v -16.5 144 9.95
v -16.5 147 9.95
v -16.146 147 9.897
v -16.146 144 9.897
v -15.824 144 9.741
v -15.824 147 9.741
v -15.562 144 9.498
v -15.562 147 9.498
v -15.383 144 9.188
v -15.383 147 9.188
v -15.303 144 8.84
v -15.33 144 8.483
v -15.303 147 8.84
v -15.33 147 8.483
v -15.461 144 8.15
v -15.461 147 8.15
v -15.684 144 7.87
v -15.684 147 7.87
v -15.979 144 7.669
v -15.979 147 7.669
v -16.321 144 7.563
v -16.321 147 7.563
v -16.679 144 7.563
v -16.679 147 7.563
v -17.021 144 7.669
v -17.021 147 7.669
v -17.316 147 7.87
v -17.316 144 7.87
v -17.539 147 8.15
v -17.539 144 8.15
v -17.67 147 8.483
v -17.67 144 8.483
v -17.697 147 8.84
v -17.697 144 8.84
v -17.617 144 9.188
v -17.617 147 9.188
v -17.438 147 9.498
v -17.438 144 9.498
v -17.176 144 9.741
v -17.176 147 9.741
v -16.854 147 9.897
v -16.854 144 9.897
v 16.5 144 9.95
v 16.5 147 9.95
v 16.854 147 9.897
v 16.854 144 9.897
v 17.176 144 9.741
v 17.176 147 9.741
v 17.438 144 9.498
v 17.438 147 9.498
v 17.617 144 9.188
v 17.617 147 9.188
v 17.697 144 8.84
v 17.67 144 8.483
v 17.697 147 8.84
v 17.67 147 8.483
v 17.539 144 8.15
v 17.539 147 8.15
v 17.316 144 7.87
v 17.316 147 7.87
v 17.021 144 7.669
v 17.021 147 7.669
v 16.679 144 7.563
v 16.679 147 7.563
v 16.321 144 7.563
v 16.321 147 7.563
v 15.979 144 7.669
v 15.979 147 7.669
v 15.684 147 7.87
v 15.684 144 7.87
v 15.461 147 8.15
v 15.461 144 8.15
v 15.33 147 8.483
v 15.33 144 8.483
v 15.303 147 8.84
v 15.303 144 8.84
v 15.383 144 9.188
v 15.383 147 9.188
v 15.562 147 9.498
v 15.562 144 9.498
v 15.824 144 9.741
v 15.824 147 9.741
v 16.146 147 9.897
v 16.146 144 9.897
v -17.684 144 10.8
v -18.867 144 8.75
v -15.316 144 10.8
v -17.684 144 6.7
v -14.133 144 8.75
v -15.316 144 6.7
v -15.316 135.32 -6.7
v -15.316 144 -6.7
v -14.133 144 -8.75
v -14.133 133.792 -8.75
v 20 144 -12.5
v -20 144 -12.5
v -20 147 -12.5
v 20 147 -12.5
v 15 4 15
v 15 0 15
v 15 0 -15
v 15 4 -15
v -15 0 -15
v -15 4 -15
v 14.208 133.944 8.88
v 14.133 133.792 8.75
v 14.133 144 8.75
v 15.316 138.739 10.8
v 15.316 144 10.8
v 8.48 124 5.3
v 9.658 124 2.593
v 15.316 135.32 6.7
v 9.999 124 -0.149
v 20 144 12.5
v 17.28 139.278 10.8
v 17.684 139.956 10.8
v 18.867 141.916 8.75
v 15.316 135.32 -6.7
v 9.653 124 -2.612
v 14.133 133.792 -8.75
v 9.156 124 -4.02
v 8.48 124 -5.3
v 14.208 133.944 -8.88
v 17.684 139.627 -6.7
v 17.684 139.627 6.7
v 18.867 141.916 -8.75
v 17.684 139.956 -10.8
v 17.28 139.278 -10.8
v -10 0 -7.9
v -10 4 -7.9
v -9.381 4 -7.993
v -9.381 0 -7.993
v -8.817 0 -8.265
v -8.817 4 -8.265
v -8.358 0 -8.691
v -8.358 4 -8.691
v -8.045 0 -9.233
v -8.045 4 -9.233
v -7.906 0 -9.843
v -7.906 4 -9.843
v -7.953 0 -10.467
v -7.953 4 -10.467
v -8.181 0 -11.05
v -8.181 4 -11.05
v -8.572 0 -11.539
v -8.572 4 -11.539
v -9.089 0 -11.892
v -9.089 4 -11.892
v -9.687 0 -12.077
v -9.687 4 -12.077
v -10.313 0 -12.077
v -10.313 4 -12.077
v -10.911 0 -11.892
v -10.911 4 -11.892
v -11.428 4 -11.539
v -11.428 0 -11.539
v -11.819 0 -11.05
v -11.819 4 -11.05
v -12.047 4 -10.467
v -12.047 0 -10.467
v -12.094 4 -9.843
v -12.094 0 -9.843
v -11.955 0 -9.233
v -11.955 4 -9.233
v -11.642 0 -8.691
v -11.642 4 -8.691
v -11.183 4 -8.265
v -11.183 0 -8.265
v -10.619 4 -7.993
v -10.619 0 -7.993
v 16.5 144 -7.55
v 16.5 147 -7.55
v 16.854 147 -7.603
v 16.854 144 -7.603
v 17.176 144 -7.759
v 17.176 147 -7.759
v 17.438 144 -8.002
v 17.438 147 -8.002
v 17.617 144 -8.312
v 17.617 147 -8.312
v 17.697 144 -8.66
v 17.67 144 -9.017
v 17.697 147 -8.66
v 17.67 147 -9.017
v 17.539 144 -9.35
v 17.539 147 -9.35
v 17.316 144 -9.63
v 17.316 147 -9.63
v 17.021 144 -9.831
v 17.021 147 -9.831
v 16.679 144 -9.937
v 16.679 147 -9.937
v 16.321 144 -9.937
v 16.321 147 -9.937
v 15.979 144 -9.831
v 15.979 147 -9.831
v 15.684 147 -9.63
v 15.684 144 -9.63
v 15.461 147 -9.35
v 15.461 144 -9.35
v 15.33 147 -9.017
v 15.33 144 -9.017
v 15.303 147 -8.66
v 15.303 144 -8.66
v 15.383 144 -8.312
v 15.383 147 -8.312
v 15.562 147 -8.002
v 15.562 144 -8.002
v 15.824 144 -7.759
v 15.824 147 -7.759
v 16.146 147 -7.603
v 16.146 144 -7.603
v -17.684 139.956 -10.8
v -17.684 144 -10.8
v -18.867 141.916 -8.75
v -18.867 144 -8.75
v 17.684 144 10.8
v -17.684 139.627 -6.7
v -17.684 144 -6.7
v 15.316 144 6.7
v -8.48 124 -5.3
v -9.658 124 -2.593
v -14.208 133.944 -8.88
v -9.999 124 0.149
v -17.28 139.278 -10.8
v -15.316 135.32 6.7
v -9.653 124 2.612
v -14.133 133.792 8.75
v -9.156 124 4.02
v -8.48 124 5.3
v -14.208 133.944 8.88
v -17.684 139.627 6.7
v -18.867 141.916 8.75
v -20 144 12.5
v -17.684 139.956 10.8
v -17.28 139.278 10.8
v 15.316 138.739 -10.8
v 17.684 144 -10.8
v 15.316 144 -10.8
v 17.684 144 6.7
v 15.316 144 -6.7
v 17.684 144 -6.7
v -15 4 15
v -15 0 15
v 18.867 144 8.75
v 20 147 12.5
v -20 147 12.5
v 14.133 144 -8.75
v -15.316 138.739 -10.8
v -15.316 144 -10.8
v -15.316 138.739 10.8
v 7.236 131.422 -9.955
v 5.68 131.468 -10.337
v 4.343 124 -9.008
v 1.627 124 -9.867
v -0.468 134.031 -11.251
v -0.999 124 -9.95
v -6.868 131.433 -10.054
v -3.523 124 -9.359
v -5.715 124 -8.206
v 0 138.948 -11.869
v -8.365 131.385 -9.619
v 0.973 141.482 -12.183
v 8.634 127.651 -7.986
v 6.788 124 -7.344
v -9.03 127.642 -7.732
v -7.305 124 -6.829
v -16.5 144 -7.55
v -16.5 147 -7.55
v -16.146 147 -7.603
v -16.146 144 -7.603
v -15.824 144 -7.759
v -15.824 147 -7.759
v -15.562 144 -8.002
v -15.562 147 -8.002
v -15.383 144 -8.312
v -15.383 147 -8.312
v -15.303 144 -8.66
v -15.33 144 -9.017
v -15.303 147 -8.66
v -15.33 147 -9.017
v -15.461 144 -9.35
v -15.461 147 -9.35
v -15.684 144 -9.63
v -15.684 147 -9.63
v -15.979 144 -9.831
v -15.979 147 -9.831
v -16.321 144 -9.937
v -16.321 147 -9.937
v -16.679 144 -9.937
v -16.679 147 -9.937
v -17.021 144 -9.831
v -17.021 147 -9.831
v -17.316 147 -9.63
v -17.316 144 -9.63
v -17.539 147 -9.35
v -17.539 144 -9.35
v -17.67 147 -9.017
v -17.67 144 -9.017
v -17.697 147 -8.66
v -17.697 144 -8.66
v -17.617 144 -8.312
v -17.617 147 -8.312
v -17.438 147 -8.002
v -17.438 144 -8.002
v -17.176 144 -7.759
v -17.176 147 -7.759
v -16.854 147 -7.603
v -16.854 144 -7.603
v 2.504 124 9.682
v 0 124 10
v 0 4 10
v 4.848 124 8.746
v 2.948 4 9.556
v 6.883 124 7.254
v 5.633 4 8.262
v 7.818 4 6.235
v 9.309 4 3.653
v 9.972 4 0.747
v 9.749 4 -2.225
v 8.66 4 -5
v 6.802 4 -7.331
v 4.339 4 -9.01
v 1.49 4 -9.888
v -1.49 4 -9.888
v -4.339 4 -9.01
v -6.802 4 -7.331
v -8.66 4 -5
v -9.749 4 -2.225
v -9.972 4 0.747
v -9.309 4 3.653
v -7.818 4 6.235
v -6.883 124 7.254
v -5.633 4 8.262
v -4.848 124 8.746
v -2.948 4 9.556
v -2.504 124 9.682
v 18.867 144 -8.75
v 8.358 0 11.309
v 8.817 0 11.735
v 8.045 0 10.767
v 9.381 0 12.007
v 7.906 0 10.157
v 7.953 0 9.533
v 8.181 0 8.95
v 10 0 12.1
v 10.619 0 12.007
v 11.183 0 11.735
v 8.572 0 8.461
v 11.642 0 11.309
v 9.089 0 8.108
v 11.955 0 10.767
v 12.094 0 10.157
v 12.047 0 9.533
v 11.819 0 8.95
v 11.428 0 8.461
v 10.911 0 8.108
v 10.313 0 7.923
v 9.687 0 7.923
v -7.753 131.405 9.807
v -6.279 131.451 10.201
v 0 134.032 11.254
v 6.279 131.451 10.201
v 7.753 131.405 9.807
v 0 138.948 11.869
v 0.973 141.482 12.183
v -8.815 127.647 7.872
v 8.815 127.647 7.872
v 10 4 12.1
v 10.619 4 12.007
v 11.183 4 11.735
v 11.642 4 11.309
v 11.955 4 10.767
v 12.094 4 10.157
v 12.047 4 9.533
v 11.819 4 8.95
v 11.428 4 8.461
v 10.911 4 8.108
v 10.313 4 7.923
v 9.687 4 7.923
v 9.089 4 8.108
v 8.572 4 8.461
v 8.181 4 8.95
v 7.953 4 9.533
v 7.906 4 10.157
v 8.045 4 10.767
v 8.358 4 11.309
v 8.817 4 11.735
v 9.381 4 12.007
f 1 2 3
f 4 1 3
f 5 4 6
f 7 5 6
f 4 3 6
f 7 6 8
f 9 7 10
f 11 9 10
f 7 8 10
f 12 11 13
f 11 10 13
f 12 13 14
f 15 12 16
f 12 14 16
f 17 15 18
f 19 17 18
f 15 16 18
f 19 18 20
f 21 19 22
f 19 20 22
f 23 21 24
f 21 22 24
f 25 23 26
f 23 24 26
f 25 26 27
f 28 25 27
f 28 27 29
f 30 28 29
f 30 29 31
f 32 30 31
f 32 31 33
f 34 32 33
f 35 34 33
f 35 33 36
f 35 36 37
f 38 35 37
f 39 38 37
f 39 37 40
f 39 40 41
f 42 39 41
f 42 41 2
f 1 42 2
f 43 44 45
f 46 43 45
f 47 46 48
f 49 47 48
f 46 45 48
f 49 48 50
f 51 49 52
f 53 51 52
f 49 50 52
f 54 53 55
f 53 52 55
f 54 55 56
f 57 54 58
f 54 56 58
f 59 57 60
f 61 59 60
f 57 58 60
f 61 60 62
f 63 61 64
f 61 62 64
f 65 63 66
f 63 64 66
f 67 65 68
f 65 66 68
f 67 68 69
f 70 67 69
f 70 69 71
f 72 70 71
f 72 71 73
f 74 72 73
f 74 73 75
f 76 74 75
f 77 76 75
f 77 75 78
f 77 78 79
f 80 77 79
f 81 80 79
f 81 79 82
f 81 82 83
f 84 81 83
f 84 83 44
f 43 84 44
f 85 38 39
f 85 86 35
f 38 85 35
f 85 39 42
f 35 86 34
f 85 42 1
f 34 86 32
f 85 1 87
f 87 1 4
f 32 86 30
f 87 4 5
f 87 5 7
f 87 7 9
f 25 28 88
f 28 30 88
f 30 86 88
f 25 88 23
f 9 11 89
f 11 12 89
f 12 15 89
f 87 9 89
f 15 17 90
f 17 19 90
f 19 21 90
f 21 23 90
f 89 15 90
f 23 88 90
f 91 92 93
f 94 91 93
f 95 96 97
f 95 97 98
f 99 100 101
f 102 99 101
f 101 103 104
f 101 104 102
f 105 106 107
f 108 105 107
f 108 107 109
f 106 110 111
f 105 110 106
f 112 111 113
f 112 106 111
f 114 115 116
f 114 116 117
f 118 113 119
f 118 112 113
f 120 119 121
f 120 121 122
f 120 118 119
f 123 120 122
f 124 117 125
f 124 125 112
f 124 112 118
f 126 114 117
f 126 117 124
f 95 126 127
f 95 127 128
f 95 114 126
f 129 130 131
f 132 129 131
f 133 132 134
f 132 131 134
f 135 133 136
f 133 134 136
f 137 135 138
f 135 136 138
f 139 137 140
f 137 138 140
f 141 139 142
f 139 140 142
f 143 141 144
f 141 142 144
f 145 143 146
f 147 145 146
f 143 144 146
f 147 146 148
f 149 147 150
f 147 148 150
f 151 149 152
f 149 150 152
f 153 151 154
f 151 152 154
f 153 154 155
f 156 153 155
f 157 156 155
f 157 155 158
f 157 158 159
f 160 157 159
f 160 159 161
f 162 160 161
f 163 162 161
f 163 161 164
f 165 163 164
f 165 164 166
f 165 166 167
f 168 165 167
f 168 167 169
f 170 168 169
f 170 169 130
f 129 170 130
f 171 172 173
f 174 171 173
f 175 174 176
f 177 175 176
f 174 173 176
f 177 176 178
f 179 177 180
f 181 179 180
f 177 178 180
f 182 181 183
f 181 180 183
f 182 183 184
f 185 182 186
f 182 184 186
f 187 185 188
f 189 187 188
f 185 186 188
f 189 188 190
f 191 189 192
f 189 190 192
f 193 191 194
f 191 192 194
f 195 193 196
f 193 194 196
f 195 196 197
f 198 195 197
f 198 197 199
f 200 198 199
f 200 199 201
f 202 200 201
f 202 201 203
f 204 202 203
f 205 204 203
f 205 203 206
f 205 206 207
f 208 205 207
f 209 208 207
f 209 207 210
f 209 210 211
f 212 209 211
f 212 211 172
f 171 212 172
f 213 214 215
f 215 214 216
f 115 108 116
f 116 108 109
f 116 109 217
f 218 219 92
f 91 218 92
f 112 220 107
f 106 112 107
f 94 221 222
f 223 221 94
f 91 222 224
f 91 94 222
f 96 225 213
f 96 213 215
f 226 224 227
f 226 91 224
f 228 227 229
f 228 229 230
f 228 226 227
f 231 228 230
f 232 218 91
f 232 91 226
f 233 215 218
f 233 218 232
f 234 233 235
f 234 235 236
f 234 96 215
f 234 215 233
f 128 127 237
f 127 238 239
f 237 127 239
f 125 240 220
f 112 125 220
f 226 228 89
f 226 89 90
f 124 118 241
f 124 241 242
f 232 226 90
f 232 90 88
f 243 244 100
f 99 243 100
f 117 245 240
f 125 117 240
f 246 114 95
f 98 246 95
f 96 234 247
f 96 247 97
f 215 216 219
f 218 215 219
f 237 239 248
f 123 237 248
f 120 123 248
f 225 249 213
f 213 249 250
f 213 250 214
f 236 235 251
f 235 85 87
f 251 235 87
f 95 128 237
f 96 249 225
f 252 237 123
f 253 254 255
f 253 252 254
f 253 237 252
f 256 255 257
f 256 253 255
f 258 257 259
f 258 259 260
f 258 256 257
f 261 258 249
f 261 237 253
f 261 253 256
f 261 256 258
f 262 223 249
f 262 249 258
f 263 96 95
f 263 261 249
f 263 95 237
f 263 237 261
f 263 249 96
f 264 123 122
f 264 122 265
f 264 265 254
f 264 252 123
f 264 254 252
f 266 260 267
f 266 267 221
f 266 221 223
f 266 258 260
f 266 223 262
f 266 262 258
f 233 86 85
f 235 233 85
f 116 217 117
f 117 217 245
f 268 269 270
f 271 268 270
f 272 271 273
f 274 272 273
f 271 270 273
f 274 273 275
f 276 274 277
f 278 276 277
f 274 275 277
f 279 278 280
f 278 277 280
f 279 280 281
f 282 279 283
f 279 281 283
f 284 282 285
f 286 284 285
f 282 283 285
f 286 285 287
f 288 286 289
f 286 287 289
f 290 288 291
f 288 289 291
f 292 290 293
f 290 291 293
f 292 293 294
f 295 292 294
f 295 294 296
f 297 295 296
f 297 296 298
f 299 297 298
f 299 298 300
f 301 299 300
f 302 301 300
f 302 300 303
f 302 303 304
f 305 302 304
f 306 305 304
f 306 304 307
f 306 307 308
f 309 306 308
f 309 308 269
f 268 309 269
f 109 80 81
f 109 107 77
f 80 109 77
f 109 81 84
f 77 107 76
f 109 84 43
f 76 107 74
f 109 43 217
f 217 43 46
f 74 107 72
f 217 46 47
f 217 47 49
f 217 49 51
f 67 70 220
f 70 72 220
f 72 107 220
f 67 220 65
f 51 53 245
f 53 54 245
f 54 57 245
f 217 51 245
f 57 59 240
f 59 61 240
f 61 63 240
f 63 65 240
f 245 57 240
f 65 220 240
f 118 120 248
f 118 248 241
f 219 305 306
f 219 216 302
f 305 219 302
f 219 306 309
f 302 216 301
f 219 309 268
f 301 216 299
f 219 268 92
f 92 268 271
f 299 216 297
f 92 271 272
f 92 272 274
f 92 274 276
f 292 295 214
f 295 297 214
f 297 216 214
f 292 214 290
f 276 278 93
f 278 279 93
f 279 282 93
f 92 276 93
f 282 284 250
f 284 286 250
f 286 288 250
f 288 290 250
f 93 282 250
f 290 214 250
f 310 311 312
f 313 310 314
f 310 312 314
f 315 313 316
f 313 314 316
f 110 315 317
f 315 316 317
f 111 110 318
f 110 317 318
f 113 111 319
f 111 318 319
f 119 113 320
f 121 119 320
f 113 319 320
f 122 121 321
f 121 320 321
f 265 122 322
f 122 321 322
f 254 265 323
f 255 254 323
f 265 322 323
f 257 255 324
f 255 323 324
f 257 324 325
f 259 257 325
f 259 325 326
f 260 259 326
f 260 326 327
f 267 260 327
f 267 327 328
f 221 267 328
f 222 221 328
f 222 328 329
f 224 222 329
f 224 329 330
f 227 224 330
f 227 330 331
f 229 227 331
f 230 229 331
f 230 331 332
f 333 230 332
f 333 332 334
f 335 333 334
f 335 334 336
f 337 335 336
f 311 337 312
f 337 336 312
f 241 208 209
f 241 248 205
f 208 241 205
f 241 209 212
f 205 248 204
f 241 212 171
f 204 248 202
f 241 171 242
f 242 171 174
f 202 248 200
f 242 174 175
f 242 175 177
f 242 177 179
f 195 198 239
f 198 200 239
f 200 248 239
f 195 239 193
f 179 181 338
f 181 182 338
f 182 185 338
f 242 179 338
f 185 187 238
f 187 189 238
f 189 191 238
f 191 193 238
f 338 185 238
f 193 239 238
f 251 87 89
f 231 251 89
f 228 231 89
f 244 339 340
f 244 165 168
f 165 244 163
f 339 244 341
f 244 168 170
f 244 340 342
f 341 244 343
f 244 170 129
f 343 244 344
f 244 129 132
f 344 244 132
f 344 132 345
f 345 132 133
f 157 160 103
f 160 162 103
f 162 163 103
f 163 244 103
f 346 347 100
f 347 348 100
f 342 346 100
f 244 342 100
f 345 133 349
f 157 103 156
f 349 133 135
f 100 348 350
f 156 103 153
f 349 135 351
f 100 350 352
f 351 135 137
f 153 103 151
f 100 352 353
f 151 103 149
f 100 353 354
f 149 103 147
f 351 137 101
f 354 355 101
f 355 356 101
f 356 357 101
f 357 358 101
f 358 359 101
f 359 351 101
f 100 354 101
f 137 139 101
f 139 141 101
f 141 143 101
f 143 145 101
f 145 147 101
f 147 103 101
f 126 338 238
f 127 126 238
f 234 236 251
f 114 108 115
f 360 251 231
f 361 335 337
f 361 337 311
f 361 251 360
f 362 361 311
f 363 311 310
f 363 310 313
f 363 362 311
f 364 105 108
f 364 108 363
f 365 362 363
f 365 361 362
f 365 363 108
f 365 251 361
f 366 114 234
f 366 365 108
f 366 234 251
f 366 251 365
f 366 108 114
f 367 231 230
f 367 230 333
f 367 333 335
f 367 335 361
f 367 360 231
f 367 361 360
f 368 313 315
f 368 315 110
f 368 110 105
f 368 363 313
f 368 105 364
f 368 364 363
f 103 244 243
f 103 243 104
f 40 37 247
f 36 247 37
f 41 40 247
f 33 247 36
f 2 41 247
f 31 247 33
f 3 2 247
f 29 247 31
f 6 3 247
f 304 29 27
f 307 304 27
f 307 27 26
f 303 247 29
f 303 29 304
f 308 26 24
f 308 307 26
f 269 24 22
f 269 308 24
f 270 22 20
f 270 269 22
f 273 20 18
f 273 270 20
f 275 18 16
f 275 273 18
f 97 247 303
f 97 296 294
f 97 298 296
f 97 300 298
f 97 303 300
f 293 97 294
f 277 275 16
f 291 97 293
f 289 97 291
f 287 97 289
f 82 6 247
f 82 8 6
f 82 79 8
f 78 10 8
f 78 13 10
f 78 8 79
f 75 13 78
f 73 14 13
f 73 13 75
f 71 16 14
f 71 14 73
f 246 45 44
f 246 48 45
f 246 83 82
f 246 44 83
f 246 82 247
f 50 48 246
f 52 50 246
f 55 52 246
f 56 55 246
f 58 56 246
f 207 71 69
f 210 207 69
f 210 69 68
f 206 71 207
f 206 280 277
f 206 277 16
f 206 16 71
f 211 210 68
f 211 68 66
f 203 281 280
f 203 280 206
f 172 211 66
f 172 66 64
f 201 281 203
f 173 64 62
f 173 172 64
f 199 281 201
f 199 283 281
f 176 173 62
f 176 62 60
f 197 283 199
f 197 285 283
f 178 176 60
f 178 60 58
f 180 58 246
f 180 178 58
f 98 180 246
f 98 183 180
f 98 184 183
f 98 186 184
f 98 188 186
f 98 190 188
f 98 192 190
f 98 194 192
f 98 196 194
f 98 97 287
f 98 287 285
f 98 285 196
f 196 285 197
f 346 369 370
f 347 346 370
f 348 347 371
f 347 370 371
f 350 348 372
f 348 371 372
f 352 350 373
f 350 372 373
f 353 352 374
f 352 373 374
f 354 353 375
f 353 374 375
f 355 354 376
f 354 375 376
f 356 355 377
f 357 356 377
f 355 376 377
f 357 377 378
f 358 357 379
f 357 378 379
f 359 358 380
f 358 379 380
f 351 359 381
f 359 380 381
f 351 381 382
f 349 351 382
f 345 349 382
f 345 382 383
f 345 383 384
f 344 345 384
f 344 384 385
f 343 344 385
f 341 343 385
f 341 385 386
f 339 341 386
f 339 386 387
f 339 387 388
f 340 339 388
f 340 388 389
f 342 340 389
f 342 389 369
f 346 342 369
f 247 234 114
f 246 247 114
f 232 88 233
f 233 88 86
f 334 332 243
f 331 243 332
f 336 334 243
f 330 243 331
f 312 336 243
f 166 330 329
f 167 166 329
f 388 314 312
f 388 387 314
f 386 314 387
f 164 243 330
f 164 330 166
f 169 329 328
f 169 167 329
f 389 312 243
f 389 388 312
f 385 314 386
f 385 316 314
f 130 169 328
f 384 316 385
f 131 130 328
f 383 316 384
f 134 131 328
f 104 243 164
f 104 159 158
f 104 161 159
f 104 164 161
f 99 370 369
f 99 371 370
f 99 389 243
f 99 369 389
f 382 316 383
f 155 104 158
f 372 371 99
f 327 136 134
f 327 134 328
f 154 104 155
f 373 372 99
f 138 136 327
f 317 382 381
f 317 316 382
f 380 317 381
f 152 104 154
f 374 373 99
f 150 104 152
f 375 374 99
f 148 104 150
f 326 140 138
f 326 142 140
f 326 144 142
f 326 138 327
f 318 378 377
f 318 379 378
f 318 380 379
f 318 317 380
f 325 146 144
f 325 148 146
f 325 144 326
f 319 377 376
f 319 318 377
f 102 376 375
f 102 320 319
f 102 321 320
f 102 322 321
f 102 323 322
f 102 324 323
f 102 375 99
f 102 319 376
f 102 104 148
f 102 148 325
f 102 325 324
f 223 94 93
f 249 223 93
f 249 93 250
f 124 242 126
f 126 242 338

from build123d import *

# Parameters (mm, degrees)
SKETCH1_W           = 30
SKETCH1_H           = 30
BOSS_EXTRUDE1_DEPTH = 4
SKETCH2_R           = 2.1
CUT_EXTRUDE1_DEPTH  = 22.587033145
SKETCH3_R           = 10
BOSS_EXTRUDE2_DEPTH = 120
SKETCH4_2_W         = 40
SKETCH4_2_H         = 25
BOSS_EXTRUDE3_DEPTH = 3
SKETCH7_R           = 1.2
CUT_EXTRUDE2_DEPTH  = 30
CUT_EXTRUDE3_DEPTH  = 30


with BuildPart() as part:
    # Sketch1 → Boss-Extrude1 (new body)
    with BuildSketch(Plane(origin=(0, 0, 0), x_dir=(1, 0, 0), z_dir=(0, 1, 0))):
        Rectangle(SKETCH1_W, SKETCH1_H)
    extrude(amount=BOSS_EXTRUDE1_DEPTH)

    # Sketch2 → Cut-Extrude1 (cut, through all)
    with BuildSketch(Plane(origin=(0, 4, 0), x_dir=(1, 0, 0), z_dir=(0, 1, 0))):
        with Locations((-10, 10)):
            Circle(SKETCH2_R)
        with Locations((10, -10)):
            Circle(SKETCH2_R)
    extrude(amount=-CUT_EXTRUDE1_DEPTH, mode=Mode.SUBTRACT)

    # Sketch3 → Boss-Extrude2 (add)
    with BuildSketch(Plane(origin=(0, 4, 0), x_dir=(1, 0, 0), z_dir=(0, 1, 0))):
        Circle(SKETCH3_R)
    extrude(amount=BOSS_EXTRUDE2_DEPTH)

    # Sketch5 for Loft1 → Loft1 section 0
    with BuildSketch(Plane(origin=(0, 124, 0), x_dir=(1, 0, 0), z_dir=(0, 1, 0))):
        with BuildLine():
            # circular arc as an exact rational Bezier (weights 1, cos(half-angle), 1)
            Bezier((-8.47998304, -5.2999894), (0, -18.867962264), (8.47998304, -5.2999894), weights=[1, 0.52999894, 1])
            Bezier((8.47998304, -5.2999894), (11.792476415, 0), (8.47998304, 5.2999894), weights=[1, 0.847998304, 1])
            Bezier((8.47998304, 5.2999894), (0, 18.867962264), (-8.47998304, 5.2999894), weights=[1, 0.52999894, 1])
            Bezier((-8.47998304, 5.2999894), (-11.792476415, 0), (-8.47998304, -5.2999894), weights=[1, 0.847998304, 1])
        make_face()
    # Sketch4 → Loft1 section 1
    with BuildSketch(Plane(origin=(0, 144, 0), x_dir=(1, 0, 0), z_dir=(0, 1, 0))):
        with BuildLine():
            Line((-20, -12.5), (20, -12.5))
            Line((20, -12.5), (20, 12.5))
            Line((20, 12.5), (-20, 12.5))
            Line((-20, 12.5), (-20, -12.5))
        make_face()
    loft()

    # Sketch4<2> → Boss-Extrude3 (add)
    with BuildSketch(Plane(origin=(0, 144, 0), x_dir=(1, 0, 0), z_dir=(0, 1, 0))):
        Rectangle(SKETCH4_2_W, SKETCH4_2_H)
    extrude(amount=BOSS_EXTRUDE3_DEPTH)

    # Sketch7 → Cut-Extrude2 (cut)
    with BuildSketch(Plane(origin=(0, 147, 0), x_dir=(1, 0, 0), z_dir=(0, 1, 0))):
        with Locations((-16.5, 8.75)):
            Circle(SKETCH7_R)
        with Locations((-16.5, -8.75)):
            Circle(SKETCH7_R)
        with Locations((16.5, 8.75)):
            Circle(SKETCH7_R)
        with Locations((16.5, -8.75)):
            Circle(SKETCH7_R)
    extrude(amount=-CUT_EXTRUDE2_DEPTH, mode=Mode.SUBTRACT)

    # Sketch8 → Cut-Extrude3 (cut)
    with BuildSketch(Plane(origin=(0, 144, 0), x_dir=(1, 0, 0), z_dir=(0, 1, 0))):
        Polygon((-17.683568052, 6.7), (-15.316431948, 6.7), (-14.132863896, 8.75), (-15.316431948, 10.8), (-17.683568052, 10.8), (-18.867136104, 8.75), align=None)
        Polygon((-15.316431948, -6.7), (-17.683568052, -6.7), (-18.867136104, -8.75), (-17.683568052, -10.8), (-15.316431948, -10.8), (-14.132863896, -8.75), align=None)
        Polygon((15.316431948, 6.7), (17.683568052, 6.7), (18.867136104, 8.75), (17.683568052, 10.8), (15.316431948, 10.8), (14.132863896, 8.75), align=None)
        Polygon((14.132863896, -8.75), (15.316431948, -10.8), (17.683568052, -10.8), (18.867136104, -8.75), (17.683568052, -6.7), (15.316431948, -6.7), align=None)
    extrude(amount=-CUT_EXTRUDE3_DEPTH, mode=Mode.SUBTRACT)


solid = part.part
